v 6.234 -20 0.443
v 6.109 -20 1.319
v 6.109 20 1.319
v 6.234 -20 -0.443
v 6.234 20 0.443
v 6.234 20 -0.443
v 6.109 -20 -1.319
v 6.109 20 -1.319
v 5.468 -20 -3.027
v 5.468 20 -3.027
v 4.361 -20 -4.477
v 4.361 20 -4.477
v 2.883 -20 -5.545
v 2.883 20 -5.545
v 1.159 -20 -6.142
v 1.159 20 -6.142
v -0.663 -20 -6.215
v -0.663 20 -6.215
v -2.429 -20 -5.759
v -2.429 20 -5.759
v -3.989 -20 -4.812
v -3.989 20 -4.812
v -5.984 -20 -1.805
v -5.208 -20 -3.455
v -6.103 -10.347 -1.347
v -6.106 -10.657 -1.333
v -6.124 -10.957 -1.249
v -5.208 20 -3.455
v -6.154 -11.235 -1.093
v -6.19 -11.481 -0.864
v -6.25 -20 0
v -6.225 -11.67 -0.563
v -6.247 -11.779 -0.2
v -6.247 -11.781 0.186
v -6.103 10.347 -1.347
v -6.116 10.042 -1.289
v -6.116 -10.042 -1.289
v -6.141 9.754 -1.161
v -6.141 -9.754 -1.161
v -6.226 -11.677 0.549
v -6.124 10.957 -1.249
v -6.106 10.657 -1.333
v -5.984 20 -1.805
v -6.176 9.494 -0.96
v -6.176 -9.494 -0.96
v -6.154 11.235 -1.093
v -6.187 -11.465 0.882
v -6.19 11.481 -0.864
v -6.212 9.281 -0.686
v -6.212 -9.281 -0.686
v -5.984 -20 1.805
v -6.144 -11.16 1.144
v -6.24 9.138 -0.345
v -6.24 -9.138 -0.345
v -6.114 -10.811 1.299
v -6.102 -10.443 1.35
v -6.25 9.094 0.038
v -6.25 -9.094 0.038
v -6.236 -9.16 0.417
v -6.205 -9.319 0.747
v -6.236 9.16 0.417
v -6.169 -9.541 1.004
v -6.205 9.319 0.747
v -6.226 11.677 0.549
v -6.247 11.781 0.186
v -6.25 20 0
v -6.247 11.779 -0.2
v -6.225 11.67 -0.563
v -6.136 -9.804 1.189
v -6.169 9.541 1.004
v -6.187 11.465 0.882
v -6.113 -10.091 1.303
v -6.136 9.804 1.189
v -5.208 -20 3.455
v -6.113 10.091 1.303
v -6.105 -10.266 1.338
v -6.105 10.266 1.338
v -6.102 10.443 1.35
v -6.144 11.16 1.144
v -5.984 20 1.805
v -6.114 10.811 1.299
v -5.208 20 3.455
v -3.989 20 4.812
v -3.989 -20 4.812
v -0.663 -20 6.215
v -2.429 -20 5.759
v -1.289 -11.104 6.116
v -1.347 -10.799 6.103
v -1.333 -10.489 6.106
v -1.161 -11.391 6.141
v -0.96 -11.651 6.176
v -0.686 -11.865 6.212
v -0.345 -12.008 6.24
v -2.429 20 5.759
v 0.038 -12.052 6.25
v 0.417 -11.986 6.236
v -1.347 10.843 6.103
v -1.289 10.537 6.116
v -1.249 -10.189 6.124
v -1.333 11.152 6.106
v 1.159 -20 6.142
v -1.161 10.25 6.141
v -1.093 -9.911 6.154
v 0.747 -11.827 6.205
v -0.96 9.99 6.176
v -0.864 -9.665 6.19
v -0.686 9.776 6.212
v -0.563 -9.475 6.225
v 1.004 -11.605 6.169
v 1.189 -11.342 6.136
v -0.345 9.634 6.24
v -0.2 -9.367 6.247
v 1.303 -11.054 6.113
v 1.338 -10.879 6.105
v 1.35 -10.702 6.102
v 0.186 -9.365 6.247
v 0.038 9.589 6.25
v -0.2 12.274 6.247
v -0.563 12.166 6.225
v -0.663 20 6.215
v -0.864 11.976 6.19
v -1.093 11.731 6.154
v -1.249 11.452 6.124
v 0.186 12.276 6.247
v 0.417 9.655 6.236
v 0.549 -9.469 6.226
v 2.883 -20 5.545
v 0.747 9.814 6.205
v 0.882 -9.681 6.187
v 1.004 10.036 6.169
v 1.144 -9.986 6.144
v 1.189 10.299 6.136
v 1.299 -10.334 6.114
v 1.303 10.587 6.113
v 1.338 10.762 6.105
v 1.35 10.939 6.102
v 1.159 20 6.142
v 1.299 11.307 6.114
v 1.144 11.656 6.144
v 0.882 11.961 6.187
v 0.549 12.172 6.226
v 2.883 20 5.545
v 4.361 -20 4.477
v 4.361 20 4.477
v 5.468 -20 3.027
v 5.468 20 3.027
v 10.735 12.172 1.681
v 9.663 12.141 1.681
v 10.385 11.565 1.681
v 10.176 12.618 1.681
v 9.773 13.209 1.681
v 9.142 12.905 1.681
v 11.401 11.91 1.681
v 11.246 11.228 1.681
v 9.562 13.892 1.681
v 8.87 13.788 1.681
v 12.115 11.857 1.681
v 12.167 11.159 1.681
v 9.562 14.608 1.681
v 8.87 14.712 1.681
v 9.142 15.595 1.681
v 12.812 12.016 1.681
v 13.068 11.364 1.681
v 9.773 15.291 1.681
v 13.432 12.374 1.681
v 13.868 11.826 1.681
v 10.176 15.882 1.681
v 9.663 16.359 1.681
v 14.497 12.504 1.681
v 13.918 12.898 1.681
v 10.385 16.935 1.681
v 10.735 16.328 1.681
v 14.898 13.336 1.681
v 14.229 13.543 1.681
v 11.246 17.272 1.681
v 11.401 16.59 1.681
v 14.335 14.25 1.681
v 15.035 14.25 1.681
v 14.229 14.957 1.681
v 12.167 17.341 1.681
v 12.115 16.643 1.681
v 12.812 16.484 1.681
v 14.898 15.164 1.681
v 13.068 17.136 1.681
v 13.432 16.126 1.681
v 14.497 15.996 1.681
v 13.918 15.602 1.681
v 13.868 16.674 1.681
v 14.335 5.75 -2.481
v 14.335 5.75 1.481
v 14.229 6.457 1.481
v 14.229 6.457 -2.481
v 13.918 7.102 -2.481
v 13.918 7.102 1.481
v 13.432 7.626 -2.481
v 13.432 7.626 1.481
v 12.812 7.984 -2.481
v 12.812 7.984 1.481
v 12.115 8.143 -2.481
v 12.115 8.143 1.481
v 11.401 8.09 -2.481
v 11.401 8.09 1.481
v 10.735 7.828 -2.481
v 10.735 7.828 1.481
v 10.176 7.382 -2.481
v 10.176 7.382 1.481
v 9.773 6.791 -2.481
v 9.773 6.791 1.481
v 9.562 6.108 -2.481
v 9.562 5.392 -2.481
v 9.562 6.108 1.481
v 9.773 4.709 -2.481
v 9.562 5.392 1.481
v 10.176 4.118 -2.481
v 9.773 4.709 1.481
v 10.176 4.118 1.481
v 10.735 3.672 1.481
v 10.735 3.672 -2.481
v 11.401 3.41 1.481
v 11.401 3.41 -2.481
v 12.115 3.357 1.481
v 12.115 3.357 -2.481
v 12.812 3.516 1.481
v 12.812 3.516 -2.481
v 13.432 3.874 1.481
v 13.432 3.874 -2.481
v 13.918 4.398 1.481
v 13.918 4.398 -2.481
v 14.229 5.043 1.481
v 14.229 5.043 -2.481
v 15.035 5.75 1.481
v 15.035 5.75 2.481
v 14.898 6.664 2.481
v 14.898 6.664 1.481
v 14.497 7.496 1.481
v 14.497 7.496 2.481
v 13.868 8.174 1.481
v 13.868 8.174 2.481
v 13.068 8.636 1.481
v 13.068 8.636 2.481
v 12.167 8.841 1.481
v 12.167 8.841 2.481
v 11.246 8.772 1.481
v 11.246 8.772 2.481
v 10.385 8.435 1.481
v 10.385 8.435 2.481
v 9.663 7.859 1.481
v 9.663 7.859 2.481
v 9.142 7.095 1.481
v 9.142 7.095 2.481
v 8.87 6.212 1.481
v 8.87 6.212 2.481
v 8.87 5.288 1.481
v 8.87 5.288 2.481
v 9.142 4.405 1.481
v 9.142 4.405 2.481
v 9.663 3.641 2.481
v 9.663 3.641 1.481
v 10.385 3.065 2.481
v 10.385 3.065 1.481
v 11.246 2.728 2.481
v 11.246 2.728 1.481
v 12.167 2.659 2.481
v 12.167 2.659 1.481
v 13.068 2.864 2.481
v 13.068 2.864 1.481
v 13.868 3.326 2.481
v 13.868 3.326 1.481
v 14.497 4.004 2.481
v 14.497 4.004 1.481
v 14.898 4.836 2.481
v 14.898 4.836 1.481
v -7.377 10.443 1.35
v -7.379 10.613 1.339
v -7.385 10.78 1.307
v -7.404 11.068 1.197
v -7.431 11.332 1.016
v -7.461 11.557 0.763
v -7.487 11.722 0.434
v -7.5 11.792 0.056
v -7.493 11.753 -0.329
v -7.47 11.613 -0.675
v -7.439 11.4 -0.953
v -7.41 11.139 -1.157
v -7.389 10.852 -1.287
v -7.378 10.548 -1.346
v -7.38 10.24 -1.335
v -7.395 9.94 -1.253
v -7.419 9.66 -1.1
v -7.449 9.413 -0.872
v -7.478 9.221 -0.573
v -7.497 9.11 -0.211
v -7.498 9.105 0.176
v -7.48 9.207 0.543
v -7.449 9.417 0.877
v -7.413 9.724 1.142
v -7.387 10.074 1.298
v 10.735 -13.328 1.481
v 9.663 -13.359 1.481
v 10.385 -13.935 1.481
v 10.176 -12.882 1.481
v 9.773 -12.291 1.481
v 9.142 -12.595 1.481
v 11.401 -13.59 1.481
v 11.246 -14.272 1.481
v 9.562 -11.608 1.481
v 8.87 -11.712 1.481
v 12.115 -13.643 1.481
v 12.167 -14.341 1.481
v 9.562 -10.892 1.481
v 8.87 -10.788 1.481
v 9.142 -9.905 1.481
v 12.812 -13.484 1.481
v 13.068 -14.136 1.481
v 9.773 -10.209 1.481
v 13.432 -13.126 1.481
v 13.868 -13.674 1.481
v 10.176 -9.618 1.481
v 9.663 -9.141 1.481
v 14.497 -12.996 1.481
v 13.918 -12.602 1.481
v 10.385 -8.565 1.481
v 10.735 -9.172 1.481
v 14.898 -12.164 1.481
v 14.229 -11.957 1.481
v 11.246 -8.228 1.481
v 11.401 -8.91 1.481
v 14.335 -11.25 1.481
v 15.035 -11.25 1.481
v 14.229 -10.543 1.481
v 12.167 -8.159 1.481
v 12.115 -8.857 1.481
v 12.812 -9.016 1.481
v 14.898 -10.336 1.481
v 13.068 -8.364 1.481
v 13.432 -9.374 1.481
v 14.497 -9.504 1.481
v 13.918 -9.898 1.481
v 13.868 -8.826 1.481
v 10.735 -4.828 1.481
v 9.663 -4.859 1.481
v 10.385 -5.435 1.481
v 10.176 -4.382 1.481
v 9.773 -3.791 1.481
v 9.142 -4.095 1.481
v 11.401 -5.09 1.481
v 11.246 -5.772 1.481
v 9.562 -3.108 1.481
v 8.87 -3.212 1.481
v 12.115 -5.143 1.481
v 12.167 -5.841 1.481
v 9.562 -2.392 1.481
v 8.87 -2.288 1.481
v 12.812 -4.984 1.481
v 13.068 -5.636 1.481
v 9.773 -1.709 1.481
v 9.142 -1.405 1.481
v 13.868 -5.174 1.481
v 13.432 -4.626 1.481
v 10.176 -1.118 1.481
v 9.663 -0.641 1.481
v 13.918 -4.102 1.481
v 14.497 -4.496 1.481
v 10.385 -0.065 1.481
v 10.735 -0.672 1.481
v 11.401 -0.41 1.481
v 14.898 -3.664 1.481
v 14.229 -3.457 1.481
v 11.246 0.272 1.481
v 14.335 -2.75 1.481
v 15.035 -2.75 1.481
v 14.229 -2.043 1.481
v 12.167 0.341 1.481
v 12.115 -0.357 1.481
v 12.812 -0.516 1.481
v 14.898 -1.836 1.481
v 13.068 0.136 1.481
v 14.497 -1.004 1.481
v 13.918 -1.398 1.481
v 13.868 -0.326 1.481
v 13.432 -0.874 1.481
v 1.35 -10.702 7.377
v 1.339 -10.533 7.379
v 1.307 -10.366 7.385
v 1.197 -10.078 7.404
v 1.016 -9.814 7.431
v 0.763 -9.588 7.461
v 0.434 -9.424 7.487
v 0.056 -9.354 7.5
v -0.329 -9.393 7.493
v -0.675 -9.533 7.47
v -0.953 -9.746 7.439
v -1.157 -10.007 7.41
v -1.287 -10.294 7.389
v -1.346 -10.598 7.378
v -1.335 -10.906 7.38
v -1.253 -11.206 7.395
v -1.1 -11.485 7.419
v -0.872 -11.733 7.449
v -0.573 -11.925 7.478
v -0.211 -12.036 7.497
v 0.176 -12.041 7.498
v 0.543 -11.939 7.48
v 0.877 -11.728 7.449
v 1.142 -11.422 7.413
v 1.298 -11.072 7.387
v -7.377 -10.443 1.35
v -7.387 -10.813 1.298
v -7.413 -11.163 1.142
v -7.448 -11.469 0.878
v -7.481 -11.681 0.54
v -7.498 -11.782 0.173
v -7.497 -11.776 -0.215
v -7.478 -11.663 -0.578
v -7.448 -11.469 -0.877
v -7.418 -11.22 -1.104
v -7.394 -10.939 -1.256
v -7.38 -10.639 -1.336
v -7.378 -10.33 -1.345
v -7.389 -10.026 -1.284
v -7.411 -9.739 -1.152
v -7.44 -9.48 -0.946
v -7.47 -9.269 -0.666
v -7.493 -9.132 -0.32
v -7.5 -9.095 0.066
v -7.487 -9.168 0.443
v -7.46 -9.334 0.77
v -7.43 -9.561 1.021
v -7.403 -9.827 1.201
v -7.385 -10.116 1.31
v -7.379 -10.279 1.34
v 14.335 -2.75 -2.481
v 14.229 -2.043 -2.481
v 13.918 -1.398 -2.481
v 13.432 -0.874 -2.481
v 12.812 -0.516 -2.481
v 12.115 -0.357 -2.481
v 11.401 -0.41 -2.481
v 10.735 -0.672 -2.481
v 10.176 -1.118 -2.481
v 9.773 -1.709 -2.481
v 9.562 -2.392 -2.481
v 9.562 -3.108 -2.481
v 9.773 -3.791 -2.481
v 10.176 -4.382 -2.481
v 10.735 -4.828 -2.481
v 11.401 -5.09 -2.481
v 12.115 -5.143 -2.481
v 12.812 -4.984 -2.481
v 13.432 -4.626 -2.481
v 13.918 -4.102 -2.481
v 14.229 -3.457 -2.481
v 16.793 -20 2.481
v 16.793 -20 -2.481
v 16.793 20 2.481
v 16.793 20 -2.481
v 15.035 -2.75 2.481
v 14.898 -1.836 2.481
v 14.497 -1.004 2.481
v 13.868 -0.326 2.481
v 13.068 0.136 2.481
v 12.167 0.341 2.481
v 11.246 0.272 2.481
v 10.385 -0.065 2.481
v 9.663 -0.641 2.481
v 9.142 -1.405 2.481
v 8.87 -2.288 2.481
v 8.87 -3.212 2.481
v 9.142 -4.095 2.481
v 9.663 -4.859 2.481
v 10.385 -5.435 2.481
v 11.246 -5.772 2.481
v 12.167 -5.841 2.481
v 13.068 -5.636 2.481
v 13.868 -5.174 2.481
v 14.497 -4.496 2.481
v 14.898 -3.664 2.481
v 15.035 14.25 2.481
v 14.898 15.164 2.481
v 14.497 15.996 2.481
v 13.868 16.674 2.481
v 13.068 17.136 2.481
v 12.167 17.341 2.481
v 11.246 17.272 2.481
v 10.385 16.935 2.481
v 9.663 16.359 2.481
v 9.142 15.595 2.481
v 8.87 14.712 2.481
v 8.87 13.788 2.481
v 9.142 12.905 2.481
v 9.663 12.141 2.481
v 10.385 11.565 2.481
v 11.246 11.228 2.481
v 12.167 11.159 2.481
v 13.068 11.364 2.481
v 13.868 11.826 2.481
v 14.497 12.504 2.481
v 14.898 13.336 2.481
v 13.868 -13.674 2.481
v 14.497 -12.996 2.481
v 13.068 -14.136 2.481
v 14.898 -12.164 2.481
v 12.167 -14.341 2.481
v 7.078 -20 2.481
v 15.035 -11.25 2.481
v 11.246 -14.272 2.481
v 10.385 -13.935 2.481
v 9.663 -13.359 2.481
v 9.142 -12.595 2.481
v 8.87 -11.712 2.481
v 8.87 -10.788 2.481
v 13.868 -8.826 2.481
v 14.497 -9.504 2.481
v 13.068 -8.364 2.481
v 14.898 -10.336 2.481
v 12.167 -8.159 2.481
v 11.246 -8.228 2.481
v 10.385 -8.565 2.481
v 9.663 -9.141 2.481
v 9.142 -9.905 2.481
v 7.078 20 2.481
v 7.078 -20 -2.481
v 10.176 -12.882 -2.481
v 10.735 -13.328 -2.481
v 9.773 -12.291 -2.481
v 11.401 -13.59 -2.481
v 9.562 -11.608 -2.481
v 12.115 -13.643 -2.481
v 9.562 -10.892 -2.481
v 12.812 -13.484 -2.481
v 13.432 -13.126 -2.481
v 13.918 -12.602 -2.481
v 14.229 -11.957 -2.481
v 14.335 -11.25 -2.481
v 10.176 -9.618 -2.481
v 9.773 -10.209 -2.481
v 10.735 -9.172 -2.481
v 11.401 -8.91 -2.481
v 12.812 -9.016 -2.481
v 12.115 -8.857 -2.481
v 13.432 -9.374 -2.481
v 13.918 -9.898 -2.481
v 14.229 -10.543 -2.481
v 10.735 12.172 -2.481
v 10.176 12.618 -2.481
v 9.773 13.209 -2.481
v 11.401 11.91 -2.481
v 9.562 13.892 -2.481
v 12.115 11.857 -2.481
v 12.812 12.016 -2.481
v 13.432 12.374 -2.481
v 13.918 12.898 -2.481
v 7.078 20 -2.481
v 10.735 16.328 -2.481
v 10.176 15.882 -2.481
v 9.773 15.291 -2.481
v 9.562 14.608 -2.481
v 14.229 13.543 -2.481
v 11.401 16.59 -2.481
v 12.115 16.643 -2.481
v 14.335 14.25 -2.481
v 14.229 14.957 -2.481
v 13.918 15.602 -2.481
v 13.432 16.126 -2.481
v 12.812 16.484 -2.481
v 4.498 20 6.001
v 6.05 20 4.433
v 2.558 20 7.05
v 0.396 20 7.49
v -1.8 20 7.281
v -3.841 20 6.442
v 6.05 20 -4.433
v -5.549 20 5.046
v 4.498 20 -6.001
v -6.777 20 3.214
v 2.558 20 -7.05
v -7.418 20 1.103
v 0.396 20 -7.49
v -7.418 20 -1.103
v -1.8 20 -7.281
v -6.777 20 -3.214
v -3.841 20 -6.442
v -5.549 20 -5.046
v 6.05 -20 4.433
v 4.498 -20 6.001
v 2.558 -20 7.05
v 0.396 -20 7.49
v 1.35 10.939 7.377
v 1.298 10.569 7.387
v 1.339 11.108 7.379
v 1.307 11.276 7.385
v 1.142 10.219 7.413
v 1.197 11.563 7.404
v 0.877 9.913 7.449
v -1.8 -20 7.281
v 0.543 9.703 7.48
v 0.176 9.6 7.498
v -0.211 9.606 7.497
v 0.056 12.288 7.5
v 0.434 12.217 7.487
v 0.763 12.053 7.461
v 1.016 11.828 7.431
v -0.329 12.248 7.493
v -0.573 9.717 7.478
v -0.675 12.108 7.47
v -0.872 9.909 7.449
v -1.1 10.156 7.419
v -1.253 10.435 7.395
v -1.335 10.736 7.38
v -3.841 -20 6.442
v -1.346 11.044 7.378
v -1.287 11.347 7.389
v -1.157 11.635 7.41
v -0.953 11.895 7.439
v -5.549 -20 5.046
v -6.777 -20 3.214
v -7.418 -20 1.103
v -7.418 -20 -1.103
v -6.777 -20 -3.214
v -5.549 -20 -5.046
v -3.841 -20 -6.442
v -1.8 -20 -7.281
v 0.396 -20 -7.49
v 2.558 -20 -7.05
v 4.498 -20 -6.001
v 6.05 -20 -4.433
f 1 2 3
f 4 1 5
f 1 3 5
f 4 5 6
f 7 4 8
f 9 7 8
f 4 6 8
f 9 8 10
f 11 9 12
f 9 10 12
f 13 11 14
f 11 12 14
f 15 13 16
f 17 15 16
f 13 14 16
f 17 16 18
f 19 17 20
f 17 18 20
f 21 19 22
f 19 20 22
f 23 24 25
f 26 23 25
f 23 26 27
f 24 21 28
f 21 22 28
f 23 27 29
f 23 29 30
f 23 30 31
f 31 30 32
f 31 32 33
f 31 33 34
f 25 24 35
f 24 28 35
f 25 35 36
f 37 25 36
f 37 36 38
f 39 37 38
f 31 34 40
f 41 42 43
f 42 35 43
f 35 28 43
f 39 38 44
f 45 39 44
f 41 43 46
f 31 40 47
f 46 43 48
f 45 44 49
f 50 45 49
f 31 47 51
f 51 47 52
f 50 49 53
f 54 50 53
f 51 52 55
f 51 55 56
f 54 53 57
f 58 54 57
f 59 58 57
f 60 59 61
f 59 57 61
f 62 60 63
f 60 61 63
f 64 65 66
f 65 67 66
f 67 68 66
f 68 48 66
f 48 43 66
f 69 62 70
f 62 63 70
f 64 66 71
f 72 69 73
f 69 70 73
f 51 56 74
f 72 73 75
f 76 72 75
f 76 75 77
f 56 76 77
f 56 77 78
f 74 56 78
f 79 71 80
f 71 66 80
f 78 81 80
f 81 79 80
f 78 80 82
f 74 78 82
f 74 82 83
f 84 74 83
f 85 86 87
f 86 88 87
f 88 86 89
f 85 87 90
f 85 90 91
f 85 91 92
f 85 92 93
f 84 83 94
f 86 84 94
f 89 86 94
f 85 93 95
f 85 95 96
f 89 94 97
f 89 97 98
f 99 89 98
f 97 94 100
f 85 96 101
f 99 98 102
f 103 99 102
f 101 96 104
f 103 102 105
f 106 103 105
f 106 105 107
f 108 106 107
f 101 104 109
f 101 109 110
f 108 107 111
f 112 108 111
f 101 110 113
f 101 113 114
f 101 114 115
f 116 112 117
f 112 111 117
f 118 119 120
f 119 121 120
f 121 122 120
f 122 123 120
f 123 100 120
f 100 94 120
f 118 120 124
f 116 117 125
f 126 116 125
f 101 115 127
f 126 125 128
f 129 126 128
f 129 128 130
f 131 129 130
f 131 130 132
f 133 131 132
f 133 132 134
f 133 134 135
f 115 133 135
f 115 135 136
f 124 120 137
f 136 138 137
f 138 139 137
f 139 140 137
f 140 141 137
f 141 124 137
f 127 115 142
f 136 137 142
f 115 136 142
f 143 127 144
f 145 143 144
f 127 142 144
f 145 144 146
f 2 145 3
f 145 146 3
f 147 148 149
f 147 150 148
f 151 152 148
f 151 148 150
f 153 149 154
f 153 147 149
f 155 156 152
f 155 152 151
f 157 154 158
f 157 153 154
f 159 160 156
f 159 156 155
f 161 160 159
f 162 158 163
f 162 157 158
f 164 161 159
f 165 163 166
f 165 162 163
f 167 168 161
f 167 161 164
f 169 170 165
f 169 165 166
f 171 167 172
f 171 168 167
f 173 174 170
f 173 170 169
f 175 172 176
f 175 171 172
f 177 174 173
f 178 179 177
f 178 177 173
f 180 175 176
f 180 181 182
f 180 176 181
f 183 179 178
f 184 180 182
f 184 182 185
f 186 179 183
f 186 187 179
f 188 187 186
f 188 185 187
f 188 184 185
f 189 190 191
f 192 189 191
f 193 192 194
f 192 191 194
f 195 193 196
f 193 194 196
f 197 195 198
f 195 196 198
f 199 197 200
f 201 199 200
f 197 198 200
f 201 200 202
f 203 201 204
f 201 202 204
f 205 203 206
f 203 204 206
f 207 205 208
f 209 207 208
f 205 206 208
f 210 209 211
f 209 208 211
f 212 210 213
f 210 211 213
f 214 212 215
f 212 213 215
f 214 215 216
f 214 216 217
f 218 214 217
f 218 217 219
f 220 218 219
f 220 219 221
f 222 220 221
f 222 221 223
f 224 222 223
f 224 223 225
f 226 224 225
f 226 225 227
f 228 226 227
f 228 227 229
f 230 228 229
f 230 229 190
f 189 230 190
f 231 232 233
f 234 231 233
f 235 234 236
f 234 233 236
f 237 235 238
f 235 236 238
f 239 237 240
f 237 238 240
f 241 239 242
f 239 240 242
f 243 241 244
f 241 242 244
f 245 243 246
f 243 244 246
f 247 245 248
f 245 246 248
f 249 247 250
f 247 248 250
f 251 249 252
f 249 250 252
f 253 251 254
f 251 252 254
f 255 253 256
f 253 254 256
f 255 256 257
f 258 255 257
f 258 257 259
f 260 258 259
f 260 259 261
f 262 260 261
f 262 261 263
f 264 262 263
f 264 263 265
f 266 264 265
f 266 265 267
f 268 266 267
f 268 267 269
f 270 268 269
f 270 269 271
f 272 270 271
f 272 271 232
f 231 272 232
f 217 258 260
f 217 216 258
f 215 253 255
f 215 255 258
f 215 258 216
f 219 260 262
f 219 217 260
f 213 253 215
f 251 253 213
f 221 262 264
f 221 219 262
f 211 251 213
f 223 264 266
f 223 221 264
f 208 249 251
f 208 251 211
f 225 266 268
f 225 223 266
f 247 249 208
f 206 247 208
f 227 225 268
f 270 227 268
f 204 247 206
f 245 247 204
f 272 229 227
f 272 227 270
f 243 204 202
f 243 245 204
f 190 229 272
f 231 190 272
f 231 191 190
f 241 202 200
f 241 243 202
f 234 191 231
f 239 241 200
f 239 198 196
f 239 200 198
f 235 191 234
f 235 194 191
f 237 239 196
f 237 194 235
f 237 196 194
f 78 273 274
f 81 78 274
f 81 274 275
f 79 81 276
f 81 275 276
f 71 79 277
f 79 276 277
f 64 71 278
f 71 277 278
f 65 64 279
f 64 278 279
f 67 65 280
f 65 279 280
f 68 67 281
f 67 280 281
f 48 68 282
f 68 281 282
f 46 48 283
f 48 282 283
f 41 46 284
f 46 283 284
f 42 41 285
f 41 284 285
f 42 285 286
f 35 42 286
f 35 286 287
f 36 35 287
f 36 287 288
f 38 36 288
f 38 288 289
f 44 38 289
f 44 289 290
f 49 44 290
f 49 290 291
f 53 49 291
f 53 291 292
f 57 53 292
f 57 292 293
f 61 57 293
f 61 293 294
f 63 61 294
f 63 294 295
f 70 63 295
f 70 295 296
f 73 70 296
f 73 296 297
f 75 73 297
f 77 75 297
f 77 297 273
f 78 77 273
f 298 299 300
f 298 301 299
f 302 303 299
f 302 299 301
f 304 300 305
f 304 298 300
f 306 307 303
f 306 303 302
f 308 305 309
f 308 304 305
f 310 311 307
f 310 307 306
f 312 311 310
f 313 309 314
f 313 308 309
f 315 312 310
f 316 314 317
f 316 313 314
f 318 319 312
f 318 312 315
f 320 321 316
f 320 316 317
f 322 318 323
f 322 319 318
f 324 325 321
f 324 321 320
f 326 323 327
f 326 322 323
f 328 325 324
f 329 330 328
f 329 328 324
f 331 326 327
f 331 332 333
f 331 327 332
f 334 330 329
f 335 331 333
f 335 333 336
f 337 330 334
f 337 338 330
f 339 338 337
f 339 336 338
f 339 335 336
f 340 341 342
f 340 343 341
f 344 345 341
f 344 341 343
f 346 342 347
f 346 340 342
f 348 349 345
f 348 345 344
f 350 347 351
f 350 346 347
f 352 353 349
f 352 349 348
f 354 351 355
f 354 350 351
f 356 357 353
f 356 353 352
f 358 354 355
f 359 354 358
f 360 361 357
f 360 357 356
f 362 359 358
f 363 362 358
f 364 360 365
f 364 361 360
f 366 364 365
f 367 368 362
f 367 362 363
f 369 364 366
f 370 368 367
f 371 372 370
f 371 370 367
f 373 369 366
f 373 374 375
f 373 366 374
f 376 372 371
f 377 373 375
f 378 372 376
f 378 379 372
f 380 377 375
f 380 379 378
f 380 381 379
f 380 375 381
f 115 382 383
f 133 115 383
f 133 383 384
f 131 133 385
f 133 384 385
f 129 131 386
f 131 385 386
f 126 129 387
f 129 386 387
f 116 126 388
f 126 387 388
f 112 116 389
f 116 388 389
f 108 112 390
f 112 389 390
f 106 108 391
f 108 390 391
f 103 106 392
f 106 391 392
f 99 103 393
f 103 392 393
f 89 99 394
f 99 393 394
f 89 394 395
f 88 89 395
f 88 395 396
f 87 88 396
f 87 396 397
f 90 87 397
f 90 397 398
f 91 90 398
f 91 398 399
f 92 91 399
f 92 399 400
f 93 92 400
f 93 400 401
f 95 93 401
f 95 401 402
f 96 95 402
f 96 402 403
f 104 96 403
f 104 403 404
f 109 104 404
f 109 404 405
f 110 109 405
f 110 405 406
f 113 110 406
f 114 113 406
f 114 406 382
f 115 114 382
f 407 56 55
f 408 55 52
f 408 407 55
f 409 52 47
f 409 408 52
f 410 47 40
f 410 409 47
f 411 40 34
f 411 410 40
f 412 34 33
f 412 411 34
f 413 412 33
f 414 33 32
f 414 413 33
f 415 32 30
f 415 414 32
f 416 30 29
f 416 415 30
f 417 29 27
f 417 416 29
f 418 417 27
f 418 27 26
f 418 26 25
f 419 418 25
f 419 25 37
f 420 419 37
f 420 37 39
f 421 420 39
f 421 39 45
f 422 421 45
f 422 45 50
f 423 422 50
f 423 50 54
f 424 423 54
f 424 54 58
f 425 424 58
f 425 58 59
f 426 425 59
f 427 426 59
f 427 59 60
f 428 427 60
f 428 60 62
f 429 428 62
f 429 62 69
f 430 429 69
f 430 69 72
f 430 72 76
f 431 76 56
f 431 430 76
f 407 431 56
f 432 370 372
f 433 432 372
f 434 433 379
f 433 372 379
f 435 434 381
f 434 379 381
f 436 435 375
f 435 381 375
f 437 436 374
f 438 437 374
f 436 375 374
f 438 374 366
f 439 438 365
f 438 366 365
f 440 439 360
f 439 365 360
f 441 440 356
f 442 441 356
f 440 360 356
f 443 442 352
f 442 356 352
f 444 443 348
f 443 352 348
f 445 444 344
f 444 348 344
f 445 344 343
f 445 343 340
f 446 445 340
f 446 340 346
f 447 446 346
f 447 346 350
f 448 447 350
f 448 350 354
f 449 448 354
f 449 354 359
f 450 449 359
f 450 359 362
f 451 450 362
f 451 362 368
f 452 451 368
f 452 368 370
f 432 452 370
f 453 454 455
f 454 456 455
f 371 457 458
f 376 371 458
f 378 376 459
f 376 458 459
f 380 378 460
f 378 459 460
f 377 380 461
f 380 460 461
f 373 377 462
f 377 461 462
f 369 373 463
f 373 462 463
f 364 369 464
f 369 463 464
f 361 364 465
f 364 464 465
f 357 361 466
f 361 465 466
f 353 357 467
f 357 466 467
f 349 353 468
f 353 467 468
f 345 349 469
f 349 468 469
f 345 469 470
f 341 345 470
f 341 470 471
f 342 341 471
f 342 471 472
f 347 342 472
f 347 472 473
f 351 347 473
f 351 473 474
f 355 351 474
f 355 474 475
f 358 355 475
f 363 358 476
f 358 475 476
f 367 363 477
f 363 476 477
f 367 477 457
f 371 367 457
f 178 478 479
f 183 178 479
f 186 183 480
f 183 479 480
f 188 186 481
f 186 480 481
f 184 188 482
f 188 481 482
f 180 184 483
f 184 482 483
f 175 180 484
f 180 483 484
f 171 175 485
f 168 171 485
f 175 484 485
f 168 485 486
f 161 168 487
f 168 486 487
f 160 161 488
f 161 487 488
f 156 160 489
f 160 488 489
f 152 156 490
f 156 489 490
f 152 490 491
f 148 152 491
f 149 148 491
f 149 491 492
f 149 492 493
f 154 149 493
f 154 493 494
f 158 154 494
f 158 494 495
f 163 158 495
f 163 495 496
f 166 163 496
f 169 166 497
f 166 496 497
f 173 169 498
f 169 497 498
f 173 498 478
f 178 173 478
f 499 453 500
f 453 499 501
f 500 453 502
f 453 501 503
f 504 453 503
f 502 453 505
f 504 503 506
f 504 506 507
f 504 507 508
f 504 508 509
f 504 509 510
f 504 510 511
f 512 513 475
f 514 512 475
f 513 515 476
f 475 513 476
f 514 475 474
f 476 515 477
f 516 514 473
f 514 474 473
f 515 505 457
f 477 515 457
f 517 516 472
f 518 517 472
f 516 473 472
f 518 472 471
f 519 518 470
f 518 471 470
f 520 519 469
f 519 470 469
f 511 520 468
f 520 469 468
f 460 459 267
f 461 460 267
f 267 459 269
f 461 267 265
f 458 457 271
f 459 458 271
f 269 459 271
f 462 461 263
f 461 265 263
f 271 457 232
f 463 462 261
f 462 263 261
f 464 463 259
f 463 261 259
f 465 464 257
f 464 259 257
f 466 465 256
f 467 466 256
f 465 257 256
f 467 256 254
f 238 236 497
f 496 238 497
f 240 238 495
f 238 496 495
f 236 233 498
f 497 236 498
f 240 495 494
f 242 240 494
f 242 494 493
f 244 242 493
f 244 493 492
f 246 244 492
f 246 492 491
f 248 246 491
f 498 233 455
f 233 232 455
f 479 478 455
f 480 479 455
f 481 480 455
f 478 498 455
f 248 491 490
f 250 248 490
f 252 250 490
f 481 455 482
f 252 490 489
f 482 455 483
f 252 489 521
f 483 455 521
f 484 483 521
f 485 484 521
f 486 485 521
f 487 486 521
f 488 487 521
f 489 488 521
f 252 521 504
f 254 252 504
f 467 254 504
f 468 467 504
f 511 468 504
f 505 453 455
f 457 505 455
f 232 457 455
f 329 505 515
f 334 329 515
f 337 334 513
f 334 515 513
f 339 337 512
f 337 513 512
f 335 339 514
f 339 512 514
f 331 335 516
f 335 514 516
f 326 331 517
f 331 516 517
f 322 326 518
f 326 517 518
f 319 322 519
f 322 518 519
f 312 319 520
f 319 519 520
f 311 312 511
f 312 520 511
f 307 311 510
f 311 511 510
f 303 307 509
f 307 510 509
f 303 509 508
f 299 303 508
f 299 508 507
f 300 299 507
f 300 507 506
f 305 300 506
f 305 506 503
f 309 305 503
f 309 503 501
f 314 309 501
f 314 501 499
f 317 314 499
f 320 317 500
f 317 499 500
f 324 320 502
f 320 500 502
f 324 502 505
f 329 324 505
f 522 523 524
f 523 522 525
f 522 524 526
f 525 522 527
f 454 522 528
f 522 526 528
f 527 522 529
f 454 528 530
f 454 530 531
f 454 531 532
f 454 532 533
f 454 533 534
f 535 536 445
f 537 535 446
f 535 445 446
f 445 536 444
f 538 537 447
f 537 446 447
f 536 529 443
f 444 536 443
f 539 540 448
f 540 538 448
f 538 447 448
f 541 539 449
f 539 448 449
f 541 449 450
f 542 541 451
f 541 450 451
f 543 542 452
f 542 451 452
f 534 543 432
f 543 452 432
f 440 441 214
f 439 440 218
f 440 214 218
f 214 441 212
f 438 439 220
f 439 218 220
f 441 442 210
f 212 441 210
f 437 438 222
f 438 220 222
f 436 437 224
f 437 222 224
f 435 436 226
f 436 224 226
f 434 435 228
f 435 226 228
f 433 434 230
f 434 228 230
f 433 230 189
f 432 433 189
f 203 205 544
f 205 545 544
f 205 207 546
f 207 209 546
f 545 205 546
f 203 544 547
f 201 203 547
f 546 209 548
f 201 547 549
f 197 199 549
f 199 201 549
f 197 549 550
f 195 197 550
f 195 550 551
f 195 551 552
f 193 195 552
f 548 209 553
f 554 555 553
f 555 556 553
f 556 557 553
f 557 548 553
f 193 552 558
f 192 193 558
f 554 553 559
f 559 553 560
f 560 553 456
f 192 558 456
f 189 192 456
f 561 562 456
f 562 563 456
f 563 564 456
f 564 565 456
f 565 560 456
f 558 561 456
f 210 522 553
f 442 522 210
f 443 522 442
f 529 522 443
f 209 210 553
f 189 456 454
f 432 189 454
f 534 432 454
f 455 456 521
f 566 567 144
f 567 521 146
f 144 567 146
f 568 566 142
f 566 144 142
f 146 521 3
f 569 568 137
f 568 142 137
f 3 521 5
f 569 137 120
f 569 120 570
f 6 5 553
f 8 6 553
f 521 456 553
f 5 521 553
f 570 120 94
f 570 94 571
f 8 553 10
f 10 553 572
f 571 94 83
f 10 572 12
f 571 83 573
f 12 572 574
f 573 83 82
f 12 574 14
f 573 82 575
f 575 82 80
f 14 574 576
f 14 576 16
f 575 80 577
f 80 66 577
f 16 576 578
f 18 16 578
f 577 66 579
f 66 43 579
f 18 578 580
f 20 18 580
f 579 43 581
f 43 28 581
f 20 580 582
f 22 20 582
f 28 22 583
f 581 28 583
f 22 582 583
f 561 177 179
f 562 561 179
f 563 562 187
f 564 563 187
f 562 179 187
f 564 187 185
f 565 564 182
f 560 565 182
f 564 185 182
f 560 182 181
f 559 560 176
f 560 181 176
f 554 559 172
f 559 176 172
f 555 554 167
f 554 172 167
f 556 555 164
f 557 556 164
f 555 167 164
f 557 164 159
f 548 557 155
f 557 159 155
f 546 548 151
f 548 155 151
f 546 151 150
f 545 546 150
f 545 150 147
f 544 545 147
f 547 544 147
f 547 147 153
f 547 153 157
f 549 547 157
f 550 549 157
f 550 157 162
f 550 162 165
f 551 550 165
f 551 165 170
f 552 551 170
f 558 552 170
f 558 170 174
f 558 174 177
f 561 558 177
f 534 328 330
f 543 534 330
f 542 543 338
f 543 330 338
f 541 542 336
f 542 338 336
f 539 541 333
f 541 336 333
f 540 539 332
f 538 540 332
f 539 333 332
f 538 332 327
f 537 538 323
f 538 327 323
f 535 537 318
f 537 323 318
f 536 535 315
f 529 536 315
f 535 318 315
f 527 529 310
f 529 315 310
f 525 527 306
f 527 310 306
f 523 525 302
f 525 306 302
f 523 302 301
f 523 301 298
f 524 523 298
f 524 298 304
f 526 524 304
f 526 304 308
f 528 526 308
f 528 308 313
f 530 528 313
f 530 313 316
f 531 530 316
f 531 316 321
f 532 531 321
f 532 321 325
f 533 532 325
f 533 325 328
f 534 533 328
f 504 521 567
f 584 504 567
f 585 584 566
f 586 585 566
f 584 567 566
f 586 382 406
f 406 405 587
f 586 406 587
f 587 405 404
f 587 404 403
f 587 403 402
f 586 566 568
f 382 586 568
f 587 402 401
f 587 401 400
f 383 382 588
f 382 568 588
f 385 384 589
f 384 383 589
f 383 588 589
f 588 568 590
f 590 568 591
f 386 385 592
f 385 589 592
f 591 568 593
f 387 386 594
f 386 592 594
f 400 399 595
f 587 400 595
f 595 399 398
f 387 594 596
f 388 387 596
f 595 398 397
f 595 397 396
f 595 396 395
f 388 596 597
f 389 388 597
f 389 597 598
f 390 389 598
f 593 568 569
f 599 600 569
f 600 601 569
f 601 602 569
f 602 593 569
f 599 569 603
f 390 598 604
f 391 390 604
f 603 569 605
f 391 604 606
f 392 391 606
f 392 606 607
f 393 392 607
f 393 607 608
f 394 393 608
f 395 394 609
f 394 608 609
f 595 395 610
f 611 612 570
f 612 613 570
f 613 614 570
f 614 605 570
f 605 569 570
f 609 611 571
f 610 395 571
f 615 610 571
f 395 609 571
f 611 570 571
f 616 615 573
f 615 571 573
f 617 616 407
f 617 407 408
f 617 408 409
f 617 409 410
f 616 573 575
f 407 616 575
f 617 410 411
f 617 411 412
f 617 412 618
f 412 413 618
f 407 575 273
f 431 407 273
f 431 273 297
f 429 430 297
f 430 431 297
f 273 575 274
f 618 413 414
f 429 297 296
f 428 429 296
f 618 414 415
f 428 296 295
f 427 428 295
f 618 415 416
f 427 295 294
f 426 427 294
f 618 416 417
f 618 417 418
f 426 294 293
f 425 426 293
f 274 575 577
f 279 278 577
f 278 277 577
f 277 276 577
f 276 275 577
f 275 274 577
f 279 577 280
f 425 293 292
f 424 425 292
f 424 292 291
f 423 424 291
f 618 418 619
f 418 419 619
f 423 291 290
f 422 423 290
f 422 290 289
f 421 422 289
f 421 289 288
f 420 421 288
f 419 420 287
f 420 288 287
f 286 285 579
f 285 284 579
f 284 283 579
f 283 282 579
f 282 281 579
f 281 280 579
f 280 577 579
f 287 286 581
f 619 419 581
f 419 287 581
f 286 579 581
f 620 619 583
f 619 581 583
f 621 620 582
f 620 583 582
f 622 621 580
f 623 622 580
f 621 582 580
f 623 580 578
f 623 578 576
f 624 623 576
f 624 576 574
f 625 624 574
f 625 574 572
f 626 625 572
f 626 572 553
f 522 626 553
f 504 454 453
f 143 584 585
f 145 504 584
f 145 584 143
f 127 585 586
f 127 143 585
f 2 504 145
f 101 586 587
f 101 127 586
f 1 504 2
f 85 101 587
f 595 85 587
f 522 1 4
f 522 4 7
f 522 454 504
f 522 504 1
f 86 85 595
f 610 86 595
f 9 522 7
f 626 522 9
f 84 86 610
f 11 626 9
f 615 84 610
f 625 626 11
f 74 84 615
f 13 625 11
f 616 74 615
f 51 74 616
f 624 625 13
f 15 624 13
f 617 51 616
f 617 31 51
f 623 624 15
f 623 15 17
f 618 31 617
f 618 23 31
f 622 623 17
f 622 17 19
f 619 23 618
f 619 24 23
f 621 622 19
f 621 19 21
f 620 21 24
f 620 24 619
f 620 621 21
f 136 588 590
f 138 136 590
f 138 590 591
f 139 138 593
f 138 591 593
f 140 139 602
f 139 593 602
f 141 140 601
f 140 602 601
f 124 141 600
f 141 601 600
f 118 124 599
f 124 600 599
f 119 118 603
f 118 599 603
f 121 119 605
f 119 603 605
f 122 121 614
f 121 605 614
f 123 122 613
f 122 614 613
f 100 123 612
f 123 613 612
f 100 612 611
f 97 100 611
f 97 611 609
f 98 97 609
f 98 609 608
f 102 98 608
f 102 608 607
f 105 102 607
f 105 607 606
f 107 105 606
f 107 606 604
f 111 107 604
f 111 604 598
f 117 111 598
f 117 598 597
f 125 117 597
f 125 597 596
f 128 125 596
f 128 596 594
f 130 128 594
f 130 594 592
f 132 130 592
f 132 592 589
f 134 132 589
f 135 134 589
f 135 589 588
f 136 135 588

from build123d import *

# Parameters (mm, degrees)
BOSS_EXTRUDE1_DEPTH     = 20
SKETCH2_R               = 2.4
CUT_EXTRUDE2_DEPTH      = 28.957878519
SKETCH3_R               = 3.1
CUT_EXTRUDE3_DEPTH      = 0.8
CUT_EXTRUDE4_REACH      = 34.348
CUT_EXTRUDE4_END_RADIUS = 6.25
SKETCH4_R               = 1.35
SKETCH5_R               = 1.35
CUT_EXTRUDE5_DEPTH      = 5
SKETCH6_R               = 2.4
CUT_EXTRUDE6_DEPTH      = 5
SKETCH7_R               = 3.1
CUT_EXTRUDE7_DEPTH      = 1


with BuildPart() as part:
    # Sketch1 → Boss-Extrude1 (new body)
    with BuildSketch(Plane(origin=(0, 0, 0), x_dir=(1, 0, 0), z_dir=(0, 1, 0))):
        with BuildLine():
            Line((7.077642728, 2.481324931), (16.7933357, 2.481324931))
            Line((16.7933357, 2.481324931), (16.7933357, 0.453397708))
            Line((16.7933357, 0.453397708), (16.7933357, -0.453397708))
            Line((16.7933357, -0.453397708), (16.7933357, -2.481324931))
            Line((16.7933357, -2.481324931), (7.077642728, -2.481324931))
            ThreePointArc((7.077642728, -2.481324931), (-7.5, 0), (7.077642728, 2.481324931))
        make_face()
        with BuildLine():
            ThreePointArc((6.109239102, 1.318975964), (-6.25, 0), (6.109239102, -1.318975964))
            ThreePointArc((6.109239102, -1.318975964), (6.25, 0), (6.109239102, 1.318975964))
        make_face(mode=Mode.SUBTRACT)
    boss_extrude1 = extrude(amount=BOSS_EXTRUDE1_DEPTH)

    # Sketch2 → Cut-Extrude2 (cut, through all)
    with BuildSketch(Plane.XY.offset(2.481324931)):
        with Locations((11.935489214, 14.25)):
            Circle(SKETCH2_R)
        with Locations((11.935489214, 5.75)):
            Circle(SKETCH2_R)
    extrude(amount=-CUT_EXTRUDE2_DEPTH, mode=Mode.SUBTRACT)

    # Sketch3 → Cut-Extrude3 (cut)
    with BuildSketch(Plane.XY.offset(2.481324931)):
        with Locations((11.935489214, 14.25)):
            Circle(SKETCH3_R)
        with Locations((11.935489214, 5.75)):
            Circle(SKETCH3_R)
    extrude(amount=-CUT_EXTRUDE3_DEPTH, mode=Mode.SUBTRACT)

    # Cut-Extrude4: up to this cylinder (the profile starts outside it)
    cut_extrude4_end = Plane(origin=(0, 10.443469, 0), z_dir=(0, -1, 0)) * Cylinder(CUT_EXTRUDE4_END_RADIUS, 82.196, mode=Mode.PRIVATE)
    # Sketch4 → Cut-Extrude4 (cut, up to the surface)
    with BuildSketch(Plane.ZY.offset(7.5), mode=Mode.PRIVATE) as cut_extrude4_sk1:
        with Locations((0, 10.443469374)):
            Circle(SKETCH4_R)
    cut_extrude4_tool1 = extrude(cut_extrude4_sk1.sketch, amount=-CUT_EXTRUDE4_REACH, mode=Mode.PRIVATE) - cut_extrude4_end
    cut_extrude4 = cut_extrude4_tool1.solids().sort_by_distance((-7.5, 10.443469, 0))[0]
    add(cut_extrude4, mode=Mode.SUBTRACT)

    # Mirror2: Boss-Extrude1, Cut-Extrude4 across plane
    add(boss_extrude1.mirror(Plane.ZX))
    add(cut_extrude4.mirror(Plane.ZX), mode=Mode.SUBTRACT)

    # Sketch5 → Cut-Extrude5 (cut)
    with BuildSketch(Plane.XY.offset(7.5)):
        with Locations((0, 10.938911234)):
            Circle(SKETCH5_R)
        with Locations((0, -10.702394235)):
            Circle(SKETCH5_R)
    extrude(amount=-CUT_EXTRUDE5_DEPTH, mode=Mode.SUBTRACT)

    # Sketch6 → Cut-Extrude6 (cut)
    with BuildSketch(Plane.XY.offset(2.481324931)):
        with Locations((11.935489214, -11.25)):
            Circle(SKETCH6_R)
        with Locations((11.935489214, -2.75)):
            Circle(SKETCH6_R)
    extrude(amount=-CUT_EXTRUDE6_DEPTH, mode=Mode.SUBTRACT)

    # Sketch7 → Cut-Extrude7 (cut)
    with BuildSketch(Plane.XY.offset(2.481324931)):
        with Locations((11.935489214, 5.75)):
            Circle(SKETCH7_R)
        with Locations((11.935489214, -2.75)):
            Circle(SKETCH7_R)
        with Locations((11.935489214, -11.25)):
            Circle(SKETCH7_R)
    extrude(amount=-CUT_EXTRUDE7_DEPTH, mode=Mode.SUBTRACT)


solid = part.part
